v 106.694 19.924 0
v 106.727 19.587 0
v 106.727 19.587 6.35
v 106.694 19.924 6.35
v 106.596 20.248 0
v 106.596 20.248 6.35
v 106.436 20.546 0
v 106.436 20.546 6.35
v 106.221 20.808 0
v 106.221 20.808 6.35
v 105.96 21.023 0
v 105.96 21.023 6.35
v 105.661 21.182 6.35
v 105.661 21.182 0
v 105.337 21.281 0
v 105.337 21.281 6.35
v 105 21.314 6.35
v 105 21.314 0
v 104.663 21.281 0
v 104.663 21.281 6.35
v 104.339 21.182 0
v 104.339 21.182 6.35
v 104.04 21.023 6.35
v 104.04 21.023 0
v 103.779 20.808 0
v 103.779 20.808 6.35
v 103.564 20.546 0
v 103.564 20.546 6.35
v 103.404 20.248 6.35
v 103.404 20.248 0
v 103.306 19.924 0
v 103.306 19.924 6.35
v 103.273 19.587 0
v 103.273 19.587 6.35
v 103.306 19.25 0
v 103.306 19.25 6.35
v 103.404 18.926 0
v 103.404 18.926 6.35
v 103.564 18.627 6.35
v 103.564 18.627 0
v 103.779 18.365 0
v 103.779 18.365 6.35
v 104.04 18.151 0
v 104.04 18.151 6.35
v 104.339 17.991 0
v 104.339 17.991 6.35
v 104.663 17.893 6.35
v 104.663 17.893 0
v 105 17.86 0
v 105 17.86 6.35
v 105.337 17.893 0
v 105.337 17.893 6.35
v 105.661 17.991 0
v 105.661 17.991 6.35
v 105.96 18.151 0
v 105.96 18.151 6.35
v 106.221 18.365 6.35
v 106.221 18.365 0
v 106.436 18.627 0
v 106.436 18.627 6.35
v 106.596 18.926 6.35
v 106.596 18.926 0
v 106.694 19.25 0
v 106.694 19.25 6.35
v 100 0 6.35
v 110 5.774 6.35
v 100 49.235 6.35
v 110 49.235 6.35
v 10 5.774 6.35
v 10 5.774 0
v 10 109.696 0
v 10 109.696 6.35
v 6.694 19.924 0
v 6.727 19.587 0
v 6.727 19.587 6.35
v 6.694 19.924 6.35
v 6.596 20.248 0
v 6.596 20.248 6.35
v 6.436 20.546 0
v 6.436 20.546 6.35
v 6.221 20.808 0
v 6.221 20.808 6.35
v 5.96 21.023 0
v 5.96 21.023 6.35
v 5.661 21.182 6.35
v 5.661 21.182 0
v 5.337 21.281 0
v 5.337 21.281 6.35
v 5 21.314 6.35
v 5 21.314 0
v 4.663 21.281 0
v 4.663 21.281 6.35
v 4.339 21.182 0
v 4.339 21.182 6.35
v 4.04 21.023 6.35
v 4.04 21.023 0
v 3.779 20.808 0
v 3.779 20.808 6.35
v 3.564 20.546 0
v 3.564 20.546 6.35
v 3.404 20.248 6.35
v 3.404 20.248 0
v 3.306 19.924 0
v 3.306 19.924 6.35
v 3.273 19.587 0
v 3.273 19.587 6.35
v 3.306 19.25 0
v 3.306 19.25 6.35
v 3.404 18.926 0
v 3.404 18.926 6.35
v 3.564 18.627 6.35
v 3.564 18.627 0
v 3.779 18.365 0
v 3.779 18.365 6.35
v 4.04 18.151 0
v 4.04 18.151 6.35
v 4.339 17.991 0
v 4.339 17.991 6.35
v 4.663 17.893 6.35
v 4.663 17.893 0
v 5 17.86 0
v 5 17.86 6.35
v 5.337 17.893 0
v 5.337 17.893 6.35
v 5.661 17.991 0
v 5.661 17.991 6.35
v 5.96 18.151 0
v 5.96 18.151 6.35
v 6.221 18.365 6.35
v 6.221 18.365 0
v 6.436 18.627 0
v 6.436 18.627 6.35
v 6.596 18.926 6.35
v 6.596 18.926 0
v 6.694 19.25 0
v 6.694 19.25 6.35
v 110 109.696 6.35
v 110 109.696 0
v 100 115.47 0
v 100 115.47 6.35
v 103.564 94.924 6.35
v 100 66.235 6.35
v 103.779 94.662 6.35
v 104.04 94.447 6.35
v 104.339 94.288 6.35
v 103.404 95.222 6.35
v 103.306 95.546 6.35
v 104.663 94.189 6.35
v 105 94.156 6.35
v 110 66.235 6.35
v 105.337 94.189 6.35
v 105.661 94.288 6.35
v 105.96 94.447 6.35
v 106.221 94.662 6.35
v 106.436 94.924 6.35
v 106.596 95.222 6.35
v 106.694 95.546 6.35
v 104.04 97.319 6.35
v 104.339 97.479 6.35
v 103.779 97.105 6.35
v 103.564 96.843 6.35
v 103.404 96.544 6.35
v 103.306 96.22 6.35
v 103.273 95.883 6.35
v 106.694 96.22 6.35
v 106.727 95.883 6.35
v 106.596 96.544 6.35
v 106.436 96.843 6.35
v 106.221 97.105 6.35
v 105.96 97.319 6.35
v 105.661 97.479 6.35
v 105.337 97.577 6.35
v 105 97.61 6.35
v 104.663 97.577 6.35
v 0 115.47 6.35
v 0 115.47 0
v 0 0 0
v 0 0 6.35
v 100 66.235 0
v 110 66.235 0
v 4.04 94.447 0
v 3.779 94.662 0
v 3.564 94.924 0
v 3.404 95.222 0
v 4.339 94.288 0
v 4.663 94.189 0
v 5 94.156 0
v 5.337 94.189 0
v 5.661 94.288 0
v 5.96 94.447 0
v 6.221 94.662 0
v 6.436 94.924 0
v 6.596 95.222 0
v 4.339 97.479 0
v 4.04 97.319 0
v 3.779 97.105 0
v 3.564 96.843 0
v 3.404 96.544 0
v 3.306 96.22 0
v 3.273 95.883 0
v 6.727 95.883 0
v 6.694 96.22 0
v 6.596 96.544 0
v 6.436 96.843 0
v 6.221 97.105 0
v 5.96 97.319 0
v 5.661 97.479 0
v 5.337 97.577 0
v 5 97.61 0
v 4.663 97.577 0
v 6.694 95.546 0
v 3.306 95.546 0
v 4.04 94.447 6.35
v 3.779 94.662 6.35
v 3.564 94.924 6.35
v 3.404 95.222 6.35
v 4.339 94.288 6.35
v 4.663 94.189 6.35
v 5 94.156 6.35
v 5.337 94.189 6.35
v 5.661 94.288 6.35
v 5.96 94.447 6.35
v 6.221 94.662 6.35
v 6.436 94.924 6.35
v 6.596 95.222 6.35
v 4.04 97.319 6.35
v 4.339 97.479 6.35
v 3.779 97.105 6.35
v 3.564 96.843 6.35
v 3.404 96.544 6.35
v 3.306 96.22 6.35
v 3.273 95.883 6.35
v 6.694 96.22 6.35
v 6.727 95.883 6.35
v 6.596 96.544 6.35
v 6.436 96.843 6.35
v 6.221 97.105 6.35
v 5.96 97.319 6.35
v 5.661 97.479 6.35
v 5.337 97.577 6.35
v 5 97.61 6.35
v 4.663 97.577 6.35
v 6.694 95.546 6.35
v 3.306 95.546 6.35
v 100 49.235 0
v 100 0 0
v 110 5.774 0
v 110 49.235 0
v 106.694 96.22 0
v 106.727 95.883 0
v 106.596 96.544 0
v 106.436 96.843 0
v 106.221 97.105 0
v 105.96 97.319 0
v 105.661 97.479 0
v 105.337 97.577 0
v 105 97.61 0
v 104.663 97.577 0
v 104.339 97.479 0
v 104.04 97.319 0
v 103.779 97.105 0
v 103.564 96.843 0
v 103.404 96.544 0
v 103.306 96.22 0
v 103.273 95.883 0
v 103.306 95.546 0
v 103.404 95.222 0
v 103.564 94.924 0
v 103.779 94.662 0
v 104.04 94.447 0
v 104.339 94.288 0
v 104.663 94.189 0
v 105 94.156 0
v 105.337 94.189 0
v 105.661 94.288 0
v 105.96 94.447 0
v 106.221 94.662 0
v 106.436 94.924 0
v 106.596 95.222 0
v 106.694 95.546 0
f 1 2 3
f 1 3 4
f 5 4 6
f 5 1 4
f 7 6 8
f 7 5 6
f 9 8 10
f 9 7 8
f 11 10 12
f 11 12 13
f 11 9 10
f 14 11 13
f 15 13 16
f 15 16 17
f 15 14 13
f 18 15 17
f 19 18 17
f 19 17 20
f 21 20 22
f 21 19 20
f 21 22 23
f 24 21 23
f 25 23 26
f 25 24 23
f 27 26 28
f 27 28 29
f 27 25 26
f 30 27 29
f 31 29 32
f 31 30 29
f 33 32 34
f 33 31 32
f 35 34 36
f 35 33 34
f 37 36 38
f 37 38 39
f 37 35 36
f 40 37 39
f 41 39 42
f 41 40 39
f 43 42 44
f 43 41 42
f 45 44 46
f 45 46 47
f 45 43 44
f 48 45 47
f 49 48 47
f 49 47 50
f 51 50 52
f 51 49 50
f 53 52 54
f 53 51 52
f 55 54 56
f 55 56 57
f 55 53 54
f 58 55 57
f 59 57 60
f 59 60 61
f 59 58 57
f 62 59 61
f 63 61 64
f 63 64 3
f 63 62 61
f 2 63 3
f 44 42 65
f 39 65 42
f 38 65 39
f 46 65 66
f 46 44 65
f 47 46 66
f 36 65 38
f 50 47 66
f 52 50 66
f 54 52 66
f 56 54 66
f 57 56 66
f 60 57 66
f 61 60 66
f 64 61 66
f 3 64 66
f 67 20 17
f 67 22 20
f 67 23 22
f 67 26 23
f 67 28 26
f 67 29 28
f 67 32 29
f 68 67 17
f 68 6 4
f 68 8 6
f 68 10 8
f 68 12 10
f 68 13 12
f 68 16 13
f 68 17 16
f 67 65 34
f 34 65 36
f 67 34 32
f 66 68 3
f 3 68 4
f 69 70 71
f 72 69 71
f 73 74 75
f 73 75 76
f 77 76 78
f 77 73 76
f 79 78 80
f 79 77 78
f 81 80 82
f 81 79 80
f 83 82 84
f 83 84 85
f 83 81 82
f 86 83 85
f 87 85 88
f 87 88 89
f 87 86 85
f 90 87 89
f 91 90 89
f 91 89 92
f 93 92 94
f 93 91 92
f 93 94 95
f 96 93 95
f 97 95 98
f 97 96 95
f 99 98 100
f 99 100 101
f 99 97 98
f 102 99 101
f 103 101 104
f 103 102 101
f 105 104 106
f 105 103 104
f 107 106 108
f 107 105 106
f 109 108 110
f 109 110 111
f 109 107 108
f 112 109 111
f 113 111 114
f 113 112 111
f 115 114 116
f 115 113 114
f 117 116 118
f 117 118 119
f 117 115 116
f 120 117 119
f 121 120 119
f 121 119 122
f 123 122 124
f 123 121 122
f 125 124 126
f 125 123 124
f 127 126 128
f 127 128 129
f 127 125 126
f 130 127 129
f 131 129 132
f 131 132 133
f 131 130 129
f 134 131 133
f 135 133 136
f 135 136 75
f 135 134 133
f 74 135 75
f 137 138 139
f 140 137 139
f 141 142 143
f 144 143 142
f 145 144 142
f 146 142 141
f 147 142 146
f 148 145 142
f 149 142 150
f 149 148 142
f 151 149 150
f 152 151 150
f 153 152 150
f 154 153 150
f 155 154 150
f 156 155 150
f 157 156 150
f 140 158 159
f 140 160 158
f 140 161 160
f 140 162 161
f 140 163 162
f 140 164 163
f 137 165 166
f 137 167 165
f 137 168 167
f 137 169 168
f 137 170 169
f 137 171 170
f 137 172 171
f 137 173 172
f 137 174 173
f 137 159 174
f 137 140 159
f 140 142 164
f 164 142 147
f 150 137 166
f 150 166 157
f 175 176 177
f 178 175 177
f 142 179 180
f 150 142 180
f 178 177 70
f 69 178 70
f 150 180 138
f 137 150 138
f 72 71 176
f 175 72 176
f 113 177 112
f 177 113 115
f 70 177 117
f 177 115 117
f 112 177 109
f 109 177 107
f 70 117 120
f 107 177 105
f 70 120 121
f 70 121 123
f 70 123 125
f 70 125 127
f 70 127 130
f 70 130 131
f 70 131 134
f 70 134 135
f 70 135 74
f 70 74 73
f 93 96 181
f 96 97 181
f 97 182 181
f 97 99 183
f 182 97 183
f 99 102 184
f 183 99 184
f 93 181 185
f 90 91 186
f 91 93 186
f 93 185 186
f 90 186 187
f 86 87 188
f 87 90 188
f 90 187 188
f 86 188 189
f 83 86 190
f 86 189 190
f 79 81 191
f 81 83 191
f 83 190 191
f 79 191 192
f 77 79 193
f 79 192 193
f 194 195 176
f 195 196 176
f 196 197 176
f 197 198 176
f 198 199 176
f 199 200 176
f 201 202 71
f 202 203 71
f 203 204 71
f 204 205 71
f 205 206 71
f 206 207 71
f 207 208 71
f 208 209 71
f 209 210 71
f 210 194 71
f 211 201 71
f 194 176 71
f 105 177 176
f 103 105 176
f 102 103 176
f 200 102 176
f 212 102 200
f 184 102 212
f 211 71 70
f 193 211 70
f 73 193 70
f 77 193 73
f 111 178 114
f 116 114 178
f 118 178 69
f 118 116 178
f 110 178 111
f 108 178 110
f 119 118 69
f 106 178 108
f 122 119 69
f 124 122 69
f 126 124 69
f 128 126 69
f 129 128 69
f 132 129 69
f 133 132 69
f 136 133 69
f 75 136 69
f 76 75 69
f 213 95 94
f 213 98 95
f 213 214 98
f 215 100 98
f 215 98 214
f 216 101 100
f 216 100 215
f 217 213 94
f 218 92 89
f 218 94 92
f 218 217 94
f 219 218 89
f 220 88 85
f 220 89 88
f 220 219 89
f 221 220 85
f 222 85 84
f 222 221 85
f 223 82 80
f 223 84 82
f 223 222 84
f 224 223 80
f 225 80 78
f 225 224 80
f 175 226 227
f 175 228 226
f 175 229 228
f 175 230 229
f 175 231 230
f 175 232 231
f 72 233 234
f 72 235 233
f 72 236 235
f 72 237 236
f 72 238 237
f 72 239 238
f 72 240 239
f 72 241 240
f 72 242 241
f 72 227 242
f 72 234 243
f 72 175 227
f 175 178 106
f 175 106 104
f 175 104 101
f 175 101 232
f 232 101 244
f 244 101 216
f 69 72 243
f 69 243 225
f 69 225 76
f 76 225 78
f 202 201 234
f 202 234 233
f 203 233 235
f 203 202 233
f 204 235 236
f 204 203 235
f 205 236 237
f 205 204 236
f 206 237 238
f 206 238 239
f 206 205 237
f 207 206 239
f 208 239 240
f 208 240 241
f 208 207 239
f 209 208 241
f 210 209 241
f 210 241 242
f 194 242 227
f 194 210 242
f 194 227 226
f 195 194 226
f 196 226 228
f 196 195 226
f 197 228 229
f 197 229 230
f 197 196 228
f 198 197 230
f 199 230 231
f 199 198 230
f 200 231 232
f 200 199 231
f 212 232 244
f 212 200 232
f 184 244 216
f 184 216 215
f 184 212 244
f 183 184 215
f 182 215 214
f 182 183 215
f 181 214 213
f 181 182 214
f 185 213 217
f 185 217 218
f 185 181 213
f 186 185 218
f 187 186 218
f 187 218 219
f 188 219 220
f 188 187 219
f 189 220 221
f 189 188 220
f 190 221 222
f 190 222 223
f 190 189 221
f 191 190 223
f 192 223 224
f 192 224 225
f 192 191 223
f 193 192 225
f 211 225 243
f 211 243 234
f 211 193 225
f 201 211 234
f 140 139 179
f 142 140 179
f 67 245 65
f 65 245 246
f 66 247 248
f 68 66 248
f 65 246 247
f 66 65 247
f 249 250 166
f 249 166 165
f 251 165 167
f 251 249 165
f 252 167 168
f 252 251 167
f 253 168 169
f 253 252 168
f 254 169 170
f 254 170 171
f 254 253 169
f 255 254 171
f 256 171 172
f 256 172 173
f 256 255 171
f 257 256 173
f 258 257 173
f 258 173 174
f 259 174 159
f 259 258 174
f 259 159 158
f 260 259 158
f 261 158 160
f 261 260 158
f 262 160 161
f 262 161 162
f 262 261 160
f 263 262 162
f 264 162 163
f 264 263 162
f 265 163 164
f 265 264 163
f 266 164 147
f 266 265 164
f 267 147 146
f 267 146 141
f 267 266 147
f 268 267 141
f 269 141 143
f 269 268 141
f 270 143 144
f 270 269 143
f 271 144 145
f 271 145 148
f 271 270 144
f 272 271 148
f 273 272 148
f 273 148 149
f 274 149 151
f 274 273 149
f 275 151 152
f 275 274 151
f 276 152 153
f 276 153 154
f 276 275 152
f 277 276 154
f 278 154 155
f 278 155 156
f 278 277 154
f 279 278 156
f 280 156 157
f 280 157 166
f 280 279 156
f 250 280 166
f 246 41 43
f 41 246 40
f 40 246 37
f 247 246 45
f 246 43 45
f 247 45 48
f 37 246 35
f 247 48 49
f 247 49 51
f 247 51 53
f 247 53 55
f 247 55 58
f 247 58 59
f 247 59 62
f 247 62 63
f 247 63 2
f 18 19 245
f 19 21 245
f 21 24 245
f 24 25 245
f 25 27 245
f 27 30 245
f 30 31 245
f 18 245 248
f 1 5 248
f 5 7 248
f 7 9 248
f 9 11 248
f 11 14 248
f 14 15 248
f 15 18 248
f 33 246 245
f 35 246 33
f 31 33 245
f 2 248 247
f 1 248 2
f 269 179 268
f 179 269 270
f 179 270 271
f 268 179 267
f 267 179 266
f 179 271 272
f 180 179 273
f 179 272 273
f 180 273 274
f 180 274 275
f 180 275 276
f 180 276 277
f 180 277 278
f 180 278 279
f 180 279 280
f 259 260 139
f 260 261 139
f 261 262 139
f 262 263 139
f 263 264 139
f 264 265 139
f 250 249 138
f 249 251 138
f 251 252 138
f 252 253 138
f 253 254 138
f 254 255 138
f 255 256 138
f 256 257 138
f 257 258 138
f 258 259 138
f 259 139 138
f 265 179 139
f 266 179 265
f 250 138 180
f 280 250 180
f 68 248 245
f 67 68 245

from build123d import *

# Parameters (mm, degrees)
F0_R     = 1.7272
F1_DEPTH = 6.35


# Not quite as in the source:
# - a length typed as a fraction of an inch, garbled in the dataset ("3 / 203.2 mm" for 3/8 in), is restored


with BuildPart() as f1:
    # F0 (on Top) → F1 (new body)
    with BuildSketch(Plane.XY):
        Polygon((0, 115.47), (0, 0), (10, 5.7735026919), (10, 109.6964973081), align=None)
        with Locations((5, 19.5867513459)):
            Circle(F0_R, mode=Mode.SUBTRACT)
        with Locations((5, 95.8832486541)):
            Circle(F0_R, mode=Mode.SUBTRACT)
    extrude(amount=F1_DEPTH)


with BuildPart() as f1b:
    # F0 (on Top) → F1, piece 2 (new body)
    with BuildSketch(Plane.XY):
        Polygon((100, 49.235), (100, 0), (110, 5.7735026919), (110, 49.235), align=None)
        with Locations((105, 19.5867513459)):
            Circle(F0_R, mode=Mode.SUBTRACT)
    extrude(amount=F1_DEPTH)


with BuildPart() as f1c:
    # F0 (on Top) → F1, piece 3 (new body)
    with BuildSketch(Plane.XY):
        Polygon((110, 109.6964973081), (100, 115.47), (100, 66.235), (110, 66.235), align=None)
        with Locations((105, 95.8832486541)):
            Circle(F0_R, mode=Mode.SUBTRACT)
    extrude(amount=F1_DEPTH)


solid = Compound([f1.part, f1b.part, f1c.part])
